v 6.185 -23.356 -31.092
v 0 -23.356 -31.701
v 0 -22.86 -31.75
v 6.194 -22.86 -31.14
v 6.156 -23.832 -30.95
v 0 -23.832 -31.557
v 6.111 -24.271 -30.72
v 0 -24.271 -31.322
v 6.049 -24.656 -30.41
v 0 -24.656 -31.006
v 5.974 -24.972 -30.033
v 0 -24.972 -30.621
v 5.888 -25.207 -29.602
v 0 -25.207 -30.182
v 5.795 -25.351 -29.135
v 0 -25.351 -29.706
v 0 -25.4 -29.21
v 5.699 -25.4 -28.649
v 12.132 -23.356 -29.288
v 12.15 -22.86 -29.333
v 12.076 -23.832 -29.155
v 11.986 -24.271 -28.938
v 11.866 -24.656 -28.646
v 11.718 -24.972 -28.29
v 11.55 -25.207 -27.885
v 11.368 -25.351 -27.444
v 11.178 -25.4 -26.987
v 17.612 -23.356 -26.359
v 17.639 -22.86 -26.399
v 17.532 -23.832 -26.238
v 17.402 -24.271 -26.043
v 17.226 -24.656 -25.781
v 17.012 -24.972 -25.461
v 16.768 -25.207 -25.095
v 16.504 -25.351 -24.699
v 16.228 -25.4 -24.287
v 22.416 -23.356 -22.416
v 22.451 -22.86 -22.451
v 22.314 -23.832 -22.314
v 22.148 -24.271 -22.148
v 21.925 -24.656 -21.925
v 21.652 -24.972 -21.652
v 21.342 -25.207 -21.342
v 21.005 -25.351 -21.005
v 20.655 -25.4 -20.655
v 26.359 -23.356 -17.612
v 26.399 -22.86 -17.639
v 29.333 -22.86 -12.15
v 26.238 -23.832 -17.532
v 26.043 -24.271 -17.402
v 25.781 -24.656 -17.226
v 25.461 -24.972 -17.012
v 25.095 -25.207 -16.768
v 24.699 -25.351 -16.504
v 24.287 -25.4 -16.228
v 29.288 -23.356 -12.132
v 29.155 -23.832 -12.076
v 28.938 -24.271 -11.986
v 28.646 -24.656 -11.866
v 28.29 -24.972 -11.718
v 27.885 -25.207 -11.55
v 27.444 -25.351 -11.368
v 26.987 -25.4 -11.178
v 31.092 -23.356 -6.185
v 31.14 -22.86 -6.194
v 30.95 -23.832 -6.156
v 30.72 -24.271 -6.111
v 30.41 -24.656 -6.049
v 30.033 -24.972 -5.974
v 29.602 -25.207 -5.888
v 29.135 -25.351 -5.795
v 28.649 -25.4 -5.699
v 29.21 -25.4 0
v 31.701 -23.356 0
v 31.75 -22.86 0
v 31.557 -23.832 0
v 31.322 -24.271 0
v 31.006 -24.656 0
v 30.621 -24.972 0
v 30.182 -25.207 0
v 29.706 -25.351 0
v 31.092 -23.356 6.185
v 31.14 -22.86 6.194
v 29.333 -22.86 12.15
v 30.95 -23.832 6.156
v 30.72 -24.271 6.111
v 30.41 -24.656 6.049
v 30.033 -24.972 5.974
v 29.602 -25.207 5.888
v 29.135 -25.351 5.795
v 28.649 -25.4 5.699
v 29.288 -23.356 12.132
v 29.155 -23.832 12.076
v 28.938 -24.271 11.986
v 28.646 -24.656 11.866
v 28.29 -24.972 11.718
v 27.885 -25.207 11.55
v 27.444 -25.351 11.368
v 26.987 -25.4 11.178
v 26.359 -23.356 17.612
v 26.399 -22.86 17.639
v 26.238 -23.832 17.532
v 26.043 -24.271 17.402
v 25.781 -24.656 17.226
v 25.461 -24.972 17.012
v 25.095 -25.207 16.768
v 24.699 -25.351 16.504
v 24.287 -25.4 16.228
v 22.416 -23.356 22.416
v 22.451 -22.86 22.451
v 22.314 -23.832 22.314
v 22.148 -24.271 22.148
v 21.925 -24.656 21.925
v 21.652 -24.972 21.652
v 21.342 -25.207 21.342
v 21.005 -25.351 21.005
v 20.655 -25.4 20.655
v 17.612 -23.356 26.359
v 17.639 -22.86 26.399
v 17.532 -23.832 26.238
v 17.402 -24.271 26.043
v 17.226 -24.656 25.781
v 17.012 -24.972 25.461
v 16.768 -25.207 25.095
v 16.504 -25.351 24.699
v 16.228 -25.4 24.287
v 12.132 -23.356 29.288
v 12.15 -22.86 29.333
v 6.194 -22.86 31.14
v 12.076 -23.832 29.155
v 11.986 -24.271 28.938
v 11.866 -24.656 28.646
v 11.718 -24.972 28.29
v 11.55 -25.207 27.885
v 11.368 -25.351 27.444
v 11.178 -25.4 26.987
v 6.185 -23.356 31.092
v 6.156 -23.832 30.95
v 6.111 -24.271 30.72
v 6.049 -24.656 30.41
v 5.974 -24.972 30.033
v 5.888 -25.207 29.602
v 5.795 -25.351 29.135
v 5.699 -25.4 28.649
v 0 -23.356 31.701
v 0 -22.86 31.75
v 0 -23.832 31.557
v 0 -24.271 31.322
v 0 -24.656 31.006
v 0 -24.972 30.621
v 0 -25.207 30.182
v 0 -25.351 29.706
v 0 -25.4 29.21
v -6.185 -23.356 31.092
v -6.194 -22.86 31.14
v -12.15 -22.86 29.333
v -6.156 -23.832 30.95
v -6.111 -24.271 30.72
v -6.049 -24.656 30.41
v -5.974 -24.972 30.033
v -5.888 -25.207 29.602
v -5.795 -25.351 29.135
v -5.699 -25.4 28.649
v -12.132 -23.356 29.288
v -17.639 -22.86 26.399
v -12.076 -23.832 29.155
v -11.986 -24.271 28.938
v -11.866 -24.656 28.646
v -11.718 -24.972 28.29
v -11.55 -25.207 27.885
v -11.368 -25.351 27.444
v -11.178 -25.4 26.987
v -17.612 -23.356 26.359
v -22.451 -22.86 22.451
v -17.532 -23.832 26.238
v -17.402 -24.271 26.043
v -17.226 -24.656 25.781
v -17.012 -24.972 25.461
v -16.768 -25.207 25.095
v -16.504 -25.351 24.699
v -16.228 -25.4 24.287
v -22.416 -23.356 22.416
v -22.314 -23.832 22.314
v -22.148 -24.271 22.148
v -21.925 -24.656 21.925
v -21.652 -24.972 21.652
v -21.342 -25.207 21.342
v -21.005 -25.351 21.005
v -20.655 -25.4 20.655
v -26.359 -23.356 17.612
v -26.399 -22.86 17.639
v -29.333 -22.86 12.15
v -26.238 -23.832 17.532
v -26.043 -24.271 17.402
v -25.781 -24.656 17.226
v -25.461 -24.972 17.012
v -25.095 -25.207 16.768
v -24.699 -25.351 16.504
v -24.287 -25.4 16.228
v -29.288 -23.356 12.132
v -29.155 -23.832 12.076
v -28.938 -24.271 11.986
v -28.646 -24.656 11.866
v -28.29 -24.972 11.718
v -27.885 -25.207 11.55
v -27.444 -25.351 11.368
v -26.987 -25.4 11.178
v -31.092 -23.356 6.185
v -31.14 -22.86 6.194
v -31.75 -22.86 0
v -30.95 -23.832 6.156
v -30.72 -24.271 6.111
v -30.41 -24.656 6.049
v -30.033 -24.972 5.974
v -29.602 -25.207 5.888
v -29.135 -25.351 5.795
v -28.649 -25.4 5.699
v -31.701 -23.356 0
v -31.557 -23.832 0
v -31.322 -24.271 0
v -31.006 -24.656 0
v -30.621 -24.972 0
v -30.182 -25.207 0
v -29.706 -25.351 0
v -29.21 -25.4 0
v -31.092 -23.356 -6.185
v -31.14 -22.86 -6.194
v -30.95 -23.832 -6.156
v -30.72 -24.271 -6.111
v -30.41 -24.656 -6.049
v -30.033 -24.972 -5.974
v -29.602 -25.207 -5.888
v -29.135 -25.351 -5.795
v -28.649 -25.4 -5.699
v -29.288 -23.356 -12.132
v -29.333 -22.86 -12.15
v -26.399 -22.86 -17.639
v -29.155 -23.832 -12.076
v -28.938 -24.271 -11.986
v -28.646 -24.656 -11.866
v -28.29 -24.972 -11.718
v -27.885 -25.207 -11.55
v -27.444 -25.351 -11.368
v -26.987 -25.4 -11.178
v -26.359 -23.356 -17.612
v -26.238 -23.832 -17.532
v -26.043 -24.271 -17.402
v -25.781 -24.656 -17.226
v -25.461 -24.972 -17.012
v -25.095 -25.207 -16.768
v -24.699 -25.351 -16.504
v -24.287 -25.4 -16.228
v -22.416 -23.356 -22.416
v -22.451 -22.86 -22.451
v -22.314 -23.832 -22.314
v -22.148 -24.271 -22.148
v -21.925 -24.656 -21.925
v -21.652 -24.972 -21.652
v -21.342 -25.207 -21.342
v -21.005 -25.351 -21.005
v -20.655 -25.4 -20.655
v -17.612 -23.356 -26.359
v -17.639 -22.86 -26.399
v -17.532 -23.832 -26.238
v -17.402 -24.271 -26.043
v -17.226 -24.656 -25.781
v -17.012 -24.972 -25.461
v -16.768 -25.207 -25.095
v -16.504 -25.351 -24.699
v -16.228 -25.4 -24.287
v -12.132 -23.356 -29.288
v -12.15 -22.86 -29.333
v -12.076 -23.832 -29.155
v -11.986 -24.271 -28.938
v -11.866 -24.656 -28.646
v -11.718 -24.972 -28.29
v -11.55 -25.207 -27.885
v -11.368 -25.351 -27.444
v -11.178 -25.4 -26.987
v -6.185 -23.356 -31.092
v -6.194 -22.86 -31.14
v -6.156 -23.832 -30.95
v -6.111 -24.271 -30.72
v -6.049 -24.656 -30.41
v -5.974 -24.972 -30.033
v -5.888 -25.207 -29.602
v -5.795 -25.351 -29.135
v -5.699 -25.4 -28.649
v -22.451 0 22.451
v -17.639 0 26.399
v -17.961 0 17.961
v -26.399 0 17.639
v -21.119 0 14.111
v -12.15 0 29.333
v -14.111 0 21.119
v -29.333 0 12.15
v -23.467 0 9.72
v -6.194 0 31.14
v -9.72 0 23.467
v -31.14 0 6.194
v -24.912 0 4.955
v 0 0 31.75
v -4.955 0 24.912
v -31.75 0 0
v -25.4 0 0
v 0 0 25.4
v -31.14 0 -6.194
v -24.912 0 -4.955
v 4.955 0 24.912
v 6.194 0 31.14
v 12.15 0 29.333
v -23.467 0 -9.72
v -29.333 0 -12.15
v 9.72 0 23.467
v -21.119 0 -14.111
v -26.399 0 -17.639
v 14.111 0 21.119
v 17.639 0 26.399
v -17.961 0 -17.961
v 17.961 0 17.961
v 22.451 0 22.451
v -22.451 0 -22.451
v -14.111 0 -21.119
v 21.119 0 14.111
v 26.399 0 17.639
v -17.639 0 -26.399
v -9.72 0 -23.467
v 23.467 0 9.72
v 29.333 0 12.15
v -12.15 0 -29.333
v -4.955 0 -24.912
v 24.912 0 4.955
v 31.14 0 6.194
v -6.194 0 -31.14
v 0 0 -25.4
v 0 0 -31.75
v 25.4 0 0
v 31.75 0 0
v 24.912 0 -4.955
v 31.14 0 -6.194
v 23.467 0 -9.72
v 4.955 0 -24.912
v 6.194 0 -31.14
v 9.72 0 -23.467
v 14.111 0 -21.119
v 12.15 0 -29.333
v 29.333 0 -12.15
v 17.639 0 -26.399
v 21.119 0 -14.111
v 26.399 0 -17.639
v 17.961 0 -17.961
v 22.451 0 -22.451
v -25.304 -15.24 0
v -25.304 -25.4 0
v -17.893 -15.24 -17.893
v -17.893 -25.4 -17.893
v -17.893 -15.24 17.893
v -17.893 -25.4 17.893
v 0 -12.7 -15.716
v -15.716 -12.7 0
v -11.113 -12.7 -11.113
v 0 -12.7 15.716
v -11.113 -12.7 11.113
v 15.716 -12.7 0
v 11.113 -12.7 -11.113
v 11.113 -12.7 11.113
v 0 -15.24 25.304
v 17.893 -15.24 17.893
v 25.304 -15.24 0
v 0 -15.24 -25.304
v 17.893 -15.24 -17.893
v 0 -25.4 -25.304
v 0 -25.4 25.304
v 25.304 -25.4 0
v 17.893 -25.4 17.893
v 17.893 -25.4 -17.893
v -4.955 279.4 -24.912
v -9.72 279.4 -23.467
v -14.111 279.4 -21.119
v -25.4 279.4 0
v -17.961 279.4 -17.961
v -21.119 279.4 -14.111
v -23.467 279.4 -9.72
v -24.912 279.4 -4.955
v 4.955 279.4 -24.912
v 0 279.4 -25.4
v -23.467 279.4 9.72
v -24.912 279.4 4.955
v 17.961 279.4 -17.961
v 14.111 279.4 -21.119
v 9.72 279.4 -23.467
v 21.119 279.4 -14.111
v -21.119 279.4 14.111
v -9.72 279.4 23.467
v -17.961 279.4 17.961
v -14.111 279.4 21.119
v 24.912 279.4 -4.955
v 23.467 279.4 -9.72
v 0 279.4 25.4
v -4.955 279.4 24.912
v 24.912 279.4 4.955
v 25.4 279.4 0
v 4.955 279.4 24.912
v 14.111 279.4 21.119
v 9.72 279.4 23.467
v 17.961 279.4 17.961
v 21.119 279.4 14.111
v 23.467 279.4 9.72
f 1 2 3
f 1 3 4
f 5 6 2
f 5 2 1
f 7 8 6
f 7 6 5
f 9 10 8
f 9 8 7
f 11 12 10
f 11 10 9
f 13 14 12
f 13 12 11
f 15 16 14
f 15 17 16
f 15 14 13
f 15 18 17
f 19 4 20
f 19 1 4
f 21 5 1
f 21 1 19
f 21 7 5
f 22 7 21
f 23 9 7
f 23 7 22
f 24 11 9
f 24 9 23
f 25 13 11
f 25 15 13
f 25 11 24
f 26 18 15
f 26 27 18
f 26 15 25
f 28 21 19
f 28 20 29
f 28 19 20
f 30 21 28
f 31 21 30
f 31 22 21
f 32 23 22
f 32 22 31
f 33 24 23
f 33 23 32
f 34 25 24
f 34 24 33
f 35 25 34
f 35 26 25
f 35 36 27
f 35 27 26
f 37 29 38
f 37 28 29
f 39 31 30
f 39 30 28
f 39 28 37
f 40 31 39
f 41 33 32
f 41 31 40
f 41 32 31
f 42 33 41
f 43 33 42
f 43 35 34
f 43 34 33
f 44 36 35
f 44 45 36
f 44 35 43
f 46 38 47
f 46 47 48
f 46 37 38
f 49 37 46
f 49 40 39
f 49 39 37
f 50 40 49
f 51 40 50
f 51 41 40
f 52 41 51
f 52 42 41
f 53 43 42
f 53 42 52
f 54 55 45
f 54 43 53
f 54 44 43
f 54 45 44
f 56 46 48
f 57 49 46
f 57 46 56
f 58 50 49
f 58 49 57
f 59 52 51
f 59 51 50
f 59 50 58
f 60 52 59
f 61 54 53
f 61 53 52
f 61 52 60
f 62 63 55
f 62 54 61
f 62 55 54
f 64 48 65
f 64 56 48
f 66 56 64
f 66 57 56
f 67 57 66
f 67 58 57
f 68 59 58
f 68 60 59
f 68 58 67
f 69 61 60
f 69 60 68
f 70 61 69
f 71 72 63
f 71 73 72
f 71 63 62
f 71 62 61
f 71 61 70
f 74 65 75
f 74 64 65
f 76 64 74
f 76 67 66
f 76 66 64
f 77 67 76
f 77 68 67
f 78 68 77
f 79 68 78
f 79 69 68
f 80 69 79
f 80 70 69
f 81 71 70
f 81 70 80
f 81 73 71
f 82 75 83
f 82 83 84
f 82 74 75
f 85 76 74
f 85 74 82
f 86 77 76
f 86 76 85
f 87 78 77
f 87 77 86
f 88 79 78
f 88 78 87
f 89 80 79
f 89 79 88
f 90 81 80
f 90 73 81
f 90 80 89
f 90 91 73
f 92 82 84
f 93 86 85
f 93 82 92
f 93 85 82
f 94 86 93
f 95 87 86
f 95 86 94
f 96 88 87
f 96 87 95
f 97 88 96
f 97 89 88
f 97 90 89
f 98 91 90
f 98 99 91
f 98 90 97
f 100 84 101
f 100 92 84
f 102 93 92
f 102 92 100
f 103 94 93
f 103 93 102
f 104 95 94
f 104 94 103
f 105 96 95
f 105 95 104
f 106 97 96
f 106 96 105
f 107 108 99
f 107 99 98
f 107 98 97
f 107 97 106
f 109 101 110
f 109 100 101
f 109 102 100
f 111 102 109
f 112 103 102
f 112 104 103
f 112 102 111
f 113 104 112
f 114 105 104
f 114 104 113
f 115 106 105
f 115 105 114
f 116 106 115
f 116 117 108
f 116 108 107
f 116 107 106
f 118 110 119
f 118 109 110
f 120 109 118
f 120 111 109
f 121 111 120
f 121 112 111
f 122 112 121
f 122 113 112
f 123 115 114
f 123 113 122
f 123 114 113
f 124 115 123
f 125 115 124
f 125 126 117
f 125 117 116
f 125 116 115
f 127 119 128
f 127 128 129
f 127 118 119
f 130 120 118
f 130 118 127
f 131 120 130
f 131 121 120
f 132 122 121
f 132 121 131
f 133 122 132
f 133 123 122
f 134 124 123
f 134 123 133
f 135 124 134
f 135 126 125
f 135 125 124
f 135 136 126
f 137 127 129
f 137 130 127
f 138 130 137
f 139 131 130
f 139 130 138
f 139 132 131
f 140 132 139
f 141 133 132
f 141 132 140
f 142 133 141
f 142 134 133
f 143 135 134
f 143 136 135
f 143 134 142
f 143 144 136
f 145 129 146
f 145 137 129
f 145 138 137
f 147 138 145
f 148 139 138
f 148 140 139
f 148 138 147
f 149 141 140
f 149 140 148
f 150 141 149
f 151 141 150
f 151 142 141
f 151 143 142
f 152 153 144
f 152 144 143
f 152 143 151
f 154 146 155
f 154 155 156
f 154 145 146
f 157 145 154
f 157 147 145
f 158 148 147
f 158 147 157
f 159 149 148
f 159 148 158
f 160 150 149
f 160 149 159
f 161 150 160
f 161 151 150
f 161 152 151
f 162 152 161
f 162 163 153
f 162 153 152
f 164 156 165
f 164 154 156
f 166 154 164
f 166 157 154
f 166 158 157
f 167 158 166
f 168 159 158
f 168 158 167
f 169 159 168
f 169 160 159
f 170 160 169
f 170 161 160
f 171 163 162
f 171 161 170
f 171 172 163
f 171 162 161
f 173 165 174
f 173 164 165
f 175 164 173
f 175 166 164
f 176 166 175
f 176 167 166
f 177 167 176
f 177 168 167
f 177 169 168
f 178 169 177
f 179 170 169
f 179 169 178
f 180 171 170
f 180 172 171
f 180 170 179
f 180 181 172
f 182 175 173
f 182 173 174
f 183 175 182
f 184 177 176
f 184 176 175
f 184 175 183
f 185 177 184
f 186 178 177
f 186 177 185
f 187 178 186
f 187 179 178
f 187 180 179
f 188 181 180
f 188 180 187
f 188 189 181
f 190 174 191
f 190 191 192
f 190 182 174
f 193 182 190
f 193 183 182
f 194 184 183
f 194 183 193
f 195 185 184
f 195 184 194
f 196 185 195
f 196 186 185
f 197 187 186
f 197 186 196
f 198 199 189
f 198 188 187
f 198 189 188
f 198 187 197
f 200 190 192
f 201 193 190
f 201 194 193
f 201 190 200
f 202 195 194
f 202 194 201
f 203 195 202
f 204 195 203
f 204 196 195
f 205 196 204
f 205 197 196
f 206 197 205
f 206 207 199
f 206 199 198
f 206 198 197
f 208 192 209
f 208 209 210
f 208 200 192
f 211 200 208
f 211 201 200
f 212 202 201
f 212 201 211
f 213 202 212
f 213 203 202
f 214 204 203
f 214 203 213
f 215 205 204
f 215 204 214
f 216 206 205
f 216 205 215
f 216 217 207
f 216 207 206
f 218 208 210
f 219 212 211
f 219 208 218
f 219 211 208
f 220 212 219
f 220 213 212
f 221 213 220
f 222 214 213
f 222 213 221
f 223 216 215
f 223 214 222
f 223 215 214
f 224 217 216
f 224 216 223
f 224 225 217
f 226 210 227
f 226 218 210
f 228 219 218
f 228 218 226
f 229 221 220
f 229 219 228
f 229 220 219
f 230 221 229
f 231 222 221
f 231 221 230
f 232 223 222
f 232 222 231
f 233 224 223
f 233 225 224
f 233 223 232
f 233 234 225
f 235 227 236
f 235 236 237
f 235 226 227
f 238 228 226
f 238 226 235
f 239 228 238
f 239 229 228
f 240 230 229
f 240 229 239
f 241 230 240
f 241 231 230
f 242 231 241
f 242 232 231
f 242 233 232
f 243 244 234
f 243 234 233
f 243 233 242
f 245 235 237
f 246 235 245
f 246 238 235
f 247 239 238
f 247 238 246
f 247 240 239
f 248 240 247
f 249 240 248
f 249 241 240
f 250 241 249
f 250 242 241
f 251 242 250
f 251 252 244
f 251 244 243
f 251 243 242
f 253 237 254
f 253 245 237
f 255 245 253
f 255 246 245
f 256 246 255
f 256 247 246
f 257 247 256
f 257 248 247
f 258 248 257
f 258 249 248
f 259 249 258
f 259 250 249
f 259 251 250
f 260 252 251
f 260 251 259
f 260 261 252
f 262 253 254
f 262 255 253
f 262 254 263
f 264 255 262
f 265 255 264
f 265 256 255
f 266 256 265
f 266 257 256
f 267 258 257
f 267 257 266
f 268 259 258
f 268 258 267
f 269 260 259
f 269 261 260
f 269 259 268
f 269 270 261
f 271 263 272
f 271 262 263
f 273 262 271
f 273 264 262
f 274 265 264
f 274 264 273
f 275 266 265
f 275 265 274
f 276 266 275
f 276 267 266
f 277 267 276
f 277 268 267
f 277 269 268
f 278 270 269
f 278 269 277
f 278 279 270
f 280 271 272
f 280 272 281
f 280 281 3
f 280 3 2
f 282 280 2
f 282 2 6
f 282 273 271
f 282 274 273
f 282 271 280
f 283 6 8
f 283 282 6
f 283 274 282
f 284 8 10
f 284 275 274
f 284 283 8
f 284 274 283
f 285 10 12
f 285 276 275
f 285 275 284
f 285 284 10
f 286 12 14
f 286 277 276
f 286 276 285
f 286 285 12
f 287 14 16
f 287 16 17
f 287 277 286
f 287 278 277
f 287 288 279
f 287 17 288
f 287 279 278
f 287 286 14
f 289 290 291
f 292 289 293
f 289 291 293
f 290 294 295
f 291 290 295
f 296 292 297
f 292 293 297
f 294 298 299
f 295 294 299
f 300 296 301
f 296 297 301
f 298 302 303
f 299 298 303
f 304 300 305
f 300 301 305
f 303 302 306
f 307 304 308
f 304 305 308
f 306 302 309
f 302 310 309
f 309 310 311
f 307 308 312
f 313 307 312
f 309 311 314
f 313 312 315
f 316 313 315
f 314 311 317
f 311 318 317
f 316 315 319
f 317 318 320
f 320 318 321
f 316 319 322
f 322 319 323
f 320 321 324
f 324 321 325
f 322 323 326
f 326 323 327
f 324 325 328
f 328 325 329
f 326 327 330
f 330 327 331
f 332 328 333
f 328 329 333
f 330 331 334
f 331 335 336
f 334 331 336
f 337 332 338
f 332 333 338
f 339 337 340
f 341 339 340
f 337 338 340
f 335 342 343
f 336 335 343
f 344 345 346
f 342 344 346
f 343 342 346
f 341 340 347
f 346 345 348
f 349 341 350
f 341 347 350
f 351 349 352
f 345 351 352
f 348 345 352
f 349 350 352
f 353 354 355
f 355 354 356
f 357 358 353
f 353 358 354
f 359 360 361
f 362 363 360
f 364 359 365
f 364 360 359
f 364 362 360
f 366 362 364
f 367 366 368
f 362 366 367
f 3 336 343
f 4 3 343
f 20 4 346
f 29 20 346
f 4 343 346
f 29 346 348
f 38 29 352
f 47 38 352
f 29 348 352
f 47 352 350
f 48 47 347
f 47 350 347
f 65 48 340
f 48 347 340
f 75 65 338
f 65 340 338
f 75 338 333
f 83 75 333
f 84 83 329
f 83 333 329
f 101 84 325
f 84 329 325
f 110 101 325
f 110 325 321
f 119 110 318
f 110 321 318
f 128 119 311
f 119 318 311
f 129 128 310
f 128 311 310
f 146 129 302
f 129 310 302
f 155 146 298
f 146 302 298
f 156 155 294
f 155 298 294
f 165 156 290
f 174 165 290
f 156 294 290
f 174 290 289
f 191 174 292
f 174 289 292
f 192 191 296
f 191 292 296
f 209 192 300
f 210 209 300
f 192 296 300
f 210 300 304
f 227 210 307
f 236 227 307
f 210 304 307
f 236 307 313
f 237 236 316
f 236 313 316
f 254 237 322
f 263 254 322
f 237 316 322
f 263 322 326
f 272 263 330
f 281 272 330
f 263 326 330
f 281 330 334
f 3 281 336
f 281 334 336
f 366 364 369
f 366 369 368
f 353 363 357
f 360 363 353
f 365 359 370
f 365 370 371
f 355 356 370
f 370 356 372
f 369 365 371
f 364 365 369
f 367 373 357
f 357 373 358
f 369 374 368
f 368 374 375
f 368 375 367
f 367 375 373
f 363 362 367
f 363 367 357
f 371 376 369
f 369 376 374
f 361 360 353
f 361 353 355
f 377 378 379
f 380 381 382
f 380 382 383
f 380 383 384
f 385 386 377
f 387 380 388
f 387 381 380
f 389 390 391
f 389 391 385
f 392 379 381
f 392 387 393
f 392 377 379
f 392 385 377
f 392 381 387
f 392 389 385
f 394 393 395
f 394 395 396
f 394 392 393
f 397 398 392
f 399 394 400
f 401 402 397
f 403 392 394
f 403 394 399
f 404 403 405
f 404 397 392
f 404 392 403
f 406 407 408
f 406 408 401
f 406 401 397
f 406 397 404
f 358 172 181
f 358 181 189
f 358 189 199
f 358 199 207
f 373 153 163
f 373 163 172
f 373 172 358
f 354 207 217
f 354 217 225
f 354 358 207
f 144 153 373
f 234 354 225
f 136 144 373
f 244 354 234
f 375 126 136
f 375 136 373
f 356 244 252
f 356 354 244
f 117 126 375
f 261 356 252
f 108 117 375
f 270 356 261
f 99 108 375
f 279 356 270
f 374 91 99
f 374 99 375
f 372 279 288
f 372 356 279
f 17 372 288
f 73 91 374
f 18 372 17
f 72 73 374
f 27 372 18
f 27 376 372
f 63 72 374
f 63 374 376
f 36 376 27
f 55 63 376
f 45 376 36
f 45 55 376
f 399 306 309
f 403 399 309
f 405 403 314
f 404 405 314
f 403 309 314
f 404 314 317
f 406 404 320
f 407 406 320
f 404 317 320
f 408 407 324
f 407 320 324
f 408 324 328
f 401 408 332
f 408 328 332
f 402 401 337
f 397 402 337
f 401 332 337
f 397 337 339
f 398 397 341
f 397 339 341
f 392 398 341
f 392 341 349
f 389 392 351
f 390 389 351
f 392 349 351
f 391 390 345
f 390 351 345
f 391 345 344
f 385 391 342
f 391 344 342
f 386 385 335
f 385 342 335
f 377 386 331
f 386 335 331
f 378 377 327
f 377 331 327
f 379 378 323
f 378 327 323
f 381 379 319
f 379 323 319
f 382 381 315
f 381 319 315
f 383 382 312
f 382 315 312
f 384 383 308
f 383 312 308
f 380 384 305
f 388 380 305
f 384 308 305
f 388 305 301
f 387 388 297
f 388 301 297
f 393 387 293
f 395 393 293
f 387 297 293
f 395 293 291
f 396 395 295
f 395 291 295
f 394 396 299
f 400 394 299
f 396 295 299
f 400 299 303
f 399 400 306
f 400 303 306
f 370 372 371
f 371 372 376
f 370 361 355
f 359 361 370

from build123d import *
from OCP.BRepFilletAPI import BRepFilletAPI_MakeChamfer

# Parameters (mm, degrees)
SKETCH1_R           = 25.4
BOSS_EXTRUDE1_DEPTH = 279.4
SKETCH2_R           = 31.75
BOSS_EXTRUDE2_DEPTH = 25.4
CUT_EXTRUDE1_DEPTH  = 12.7
FILLET1_R           = 2.54
CHAMFER1_SIZE       = 2.54
CHAMFER1_SIZE2      = 8.858032687


with BuildPart() as part:
    # Sketch1 → Boss-Extrude1 (new body)
    with BuildSketch(Plane(origin=(0, 0, 0), x_dir=(1, 0, 0), z_dir=(0, 1, 0))):
        with Locations(Location((0, 0, 0), (0, 0, 270))):
            Circle(SKETCH1_R)
    extrude(amount=BOSS_EXTRUDE1_DEPTH)

    # Sketch2 → Boss-Extrude2 (add)
    with BuildSketch(Plane.XZ):
        with Locations(Location((0, 0, 0), (0, 0, 270))):
            Circle(SKETCH2_R)
    extrude(amount=BOSS_EXTRUDE2_DEPTH)

    # Sketch3 → Cut-Extrude1 (cut)
    with BuildSketch(Plane.XZ.offset(25.4)):
        Polygon((25.303831814, 0), (17.892511066, 17.892511066), (0, 25.303831814), (-17.892511066, 17.892511066), (-25.303831814, 0), (-17.892511066, -17.892511066), (0, -25.303831814), (17.892511066, -17.892511066), align=None)
    extrude(amount=-CUT_EXTRUDE1_DEPTH, mode=Mode.SUBTRACT)

    # Fillet1
    fillet1_edges = [part.edges().sort_by_distance(p)[0] for p in [
        (0, -25.4, 31.75),
    ]]
    fillet(fillet1_edges, radius=FILLET1_R)

    # Chamfer1: one chamfer whose edges measure the first distance from different faces: ONE call of the kernel's chamfer builder (chamfer() names one face for all edges)
    chamfer1_edges_1 = [part.edges().sort_by_distance(p)[0] for p in [
        (8.946255533, -12.7, 21.59817144),
    ]]
    chamfer1_side_1 = [part.faces().sort_by_distance(p)[0] for p in [
        (8.946255533, -19.05, 21.59817144),
    ]]
    chamfer1_edges_2 = [part.edges().sort_by_distance(p)[0] for p in [
        (21.59817144, -12.7, 8.946255533),
    ]]
    chamfer1_side_2 = [part.faces().sort_by_distance(p)[0] for p in [
        (21.59817144, -19.05, 8.946255533),
    ]]
    chamfer1_edges_3 = [part.edges().sort_by_distance(p)[0] for p in [
        (21.59817144, -12.7, -8.946255533),
    ]]
    chamfer1_side_3 = [part.faces().sort_by_distance(p)[0] for p in [
        (21.59817144, -19.05, -8.946255533),
    ]]
    chamfer1_edges_4 = [part.edges().sort_by_distance(p)[0] for p in [
        (8.946255533, -12.7, -21.59817144),
    ]]
    chamfer1_side_4 = [part.faces().sort_by_distance(p)[0] for p in [
        (8.946255533, -19.05, -21.59817144),
    ]]
    chamfer1_edges_5 = [part.edges().sort_by_distance(p)[0] for p in [
        (-8.946255533, -12.7, -21.59817144),
    ]]
    chamfer1_side_5 = [part.faces().sort_by_distance(p)[0] for p in [
        (-8.946255533, -19.05, -21.59817144),
    ]]
    chamfer1_edges_6 = [part.edges().sort_by_distance(p)[0] for p in [
        (-21.59817144, -12.7, -8.946255533),
    ]]
    chamfer1_side_6 = [part.faces().sort_by_distance(p)[0] for p in [
        (-21.59817144, -19.05, -8.946255533),
    ]]
    chamfer1_edges_7 = [part.edges().sort_by_distance(p)[0] for p in [
        (-21.59817144, -12.7, 8.946255533),
    ]]
    chamfer1_side_7 = [part.faces().sort_by_distance(p)[0] for p in [
        (-21.59817144, -19.05, 8.946255533),
    ]]
    chamfer1_edges_8 = [part.edges().sort_by_distance(p)[0] for p in [
        (-8.946255533, -12.7, 21.59817144),
    ]]
    chamfer1_side_8 = [part.faces().sort_by_distance(p)[0] for p in [
        (-8.946255533, -19.05, 21.59817144),
    ]]
    chamfer1 = BRepFilletAPI_MakeChamfer(part.part.solid().wrapped)
    for e in chamfer1_edges_1:
        chamfer1.Add(CHAMFER1_SIZE, CHAMFER1_SIZE2, e.wrapped, chamfer1_side_1[0].wrapped)  # the first distance lies on this face
    for e in chamfer1_edges_2:
        chamfer1.Add(CHAMFER1_SIZE, CHAMFER1_SIZE2, e.wrapped, chamfer1_side_2[0].wrapped)  # the first distance lies on this face
    for e in chamfer1_edges_3:
        chamfer1.Add(CHAMFER1_SIZE, CHAMFER1_SIZE2, e.wrapped, chamfer1_side_3[0].wrapped)  # the first distance lies on this face
    for e in chamfer1_edges_4:
        chamfer1.Add(CHAMFER1_SIZE, CHAMFER1_SIZE2, e.wrapped, chamfer1_side_4[0].wrapped)  # the first distance lies on this face
    for e in chamfer1_edges_5:
        chamfer1.Add(CHAMFER1_SIZE, CHAMFER1_SIZE2, e.wrapped, chamfer1_side_5[0].wrapped)  # the first distance lies on this face
    for e in chamfer1_edges_6:
        chamfer1.Add(CHAMFER1_SIZE, CHAMFER1_SIZE2, e.wrapped, chamfer1_side_6[0].wrapped)  # the first distance lies on this face
    for e in chamfer1_edges_7:
        chamfer1.Add(CHAMFER1_SIZE, CHAMFER1_SIZE2, e.wrapped, chamfer1_side_7[0].wrapped)  # the first distance lies on this face
    for e in chamfer1_edges_8:
        chamfer1.Add(CHAMFER1_SIZE, CHAMFER1_SIZE2, e.wrapped, chamfer1_side_8[0].wrapped)  # the first distance lies on this face
    add(Compound.cast(chamfer1.Shape()), mode=Mode.REPLACE)


solid = part.part
